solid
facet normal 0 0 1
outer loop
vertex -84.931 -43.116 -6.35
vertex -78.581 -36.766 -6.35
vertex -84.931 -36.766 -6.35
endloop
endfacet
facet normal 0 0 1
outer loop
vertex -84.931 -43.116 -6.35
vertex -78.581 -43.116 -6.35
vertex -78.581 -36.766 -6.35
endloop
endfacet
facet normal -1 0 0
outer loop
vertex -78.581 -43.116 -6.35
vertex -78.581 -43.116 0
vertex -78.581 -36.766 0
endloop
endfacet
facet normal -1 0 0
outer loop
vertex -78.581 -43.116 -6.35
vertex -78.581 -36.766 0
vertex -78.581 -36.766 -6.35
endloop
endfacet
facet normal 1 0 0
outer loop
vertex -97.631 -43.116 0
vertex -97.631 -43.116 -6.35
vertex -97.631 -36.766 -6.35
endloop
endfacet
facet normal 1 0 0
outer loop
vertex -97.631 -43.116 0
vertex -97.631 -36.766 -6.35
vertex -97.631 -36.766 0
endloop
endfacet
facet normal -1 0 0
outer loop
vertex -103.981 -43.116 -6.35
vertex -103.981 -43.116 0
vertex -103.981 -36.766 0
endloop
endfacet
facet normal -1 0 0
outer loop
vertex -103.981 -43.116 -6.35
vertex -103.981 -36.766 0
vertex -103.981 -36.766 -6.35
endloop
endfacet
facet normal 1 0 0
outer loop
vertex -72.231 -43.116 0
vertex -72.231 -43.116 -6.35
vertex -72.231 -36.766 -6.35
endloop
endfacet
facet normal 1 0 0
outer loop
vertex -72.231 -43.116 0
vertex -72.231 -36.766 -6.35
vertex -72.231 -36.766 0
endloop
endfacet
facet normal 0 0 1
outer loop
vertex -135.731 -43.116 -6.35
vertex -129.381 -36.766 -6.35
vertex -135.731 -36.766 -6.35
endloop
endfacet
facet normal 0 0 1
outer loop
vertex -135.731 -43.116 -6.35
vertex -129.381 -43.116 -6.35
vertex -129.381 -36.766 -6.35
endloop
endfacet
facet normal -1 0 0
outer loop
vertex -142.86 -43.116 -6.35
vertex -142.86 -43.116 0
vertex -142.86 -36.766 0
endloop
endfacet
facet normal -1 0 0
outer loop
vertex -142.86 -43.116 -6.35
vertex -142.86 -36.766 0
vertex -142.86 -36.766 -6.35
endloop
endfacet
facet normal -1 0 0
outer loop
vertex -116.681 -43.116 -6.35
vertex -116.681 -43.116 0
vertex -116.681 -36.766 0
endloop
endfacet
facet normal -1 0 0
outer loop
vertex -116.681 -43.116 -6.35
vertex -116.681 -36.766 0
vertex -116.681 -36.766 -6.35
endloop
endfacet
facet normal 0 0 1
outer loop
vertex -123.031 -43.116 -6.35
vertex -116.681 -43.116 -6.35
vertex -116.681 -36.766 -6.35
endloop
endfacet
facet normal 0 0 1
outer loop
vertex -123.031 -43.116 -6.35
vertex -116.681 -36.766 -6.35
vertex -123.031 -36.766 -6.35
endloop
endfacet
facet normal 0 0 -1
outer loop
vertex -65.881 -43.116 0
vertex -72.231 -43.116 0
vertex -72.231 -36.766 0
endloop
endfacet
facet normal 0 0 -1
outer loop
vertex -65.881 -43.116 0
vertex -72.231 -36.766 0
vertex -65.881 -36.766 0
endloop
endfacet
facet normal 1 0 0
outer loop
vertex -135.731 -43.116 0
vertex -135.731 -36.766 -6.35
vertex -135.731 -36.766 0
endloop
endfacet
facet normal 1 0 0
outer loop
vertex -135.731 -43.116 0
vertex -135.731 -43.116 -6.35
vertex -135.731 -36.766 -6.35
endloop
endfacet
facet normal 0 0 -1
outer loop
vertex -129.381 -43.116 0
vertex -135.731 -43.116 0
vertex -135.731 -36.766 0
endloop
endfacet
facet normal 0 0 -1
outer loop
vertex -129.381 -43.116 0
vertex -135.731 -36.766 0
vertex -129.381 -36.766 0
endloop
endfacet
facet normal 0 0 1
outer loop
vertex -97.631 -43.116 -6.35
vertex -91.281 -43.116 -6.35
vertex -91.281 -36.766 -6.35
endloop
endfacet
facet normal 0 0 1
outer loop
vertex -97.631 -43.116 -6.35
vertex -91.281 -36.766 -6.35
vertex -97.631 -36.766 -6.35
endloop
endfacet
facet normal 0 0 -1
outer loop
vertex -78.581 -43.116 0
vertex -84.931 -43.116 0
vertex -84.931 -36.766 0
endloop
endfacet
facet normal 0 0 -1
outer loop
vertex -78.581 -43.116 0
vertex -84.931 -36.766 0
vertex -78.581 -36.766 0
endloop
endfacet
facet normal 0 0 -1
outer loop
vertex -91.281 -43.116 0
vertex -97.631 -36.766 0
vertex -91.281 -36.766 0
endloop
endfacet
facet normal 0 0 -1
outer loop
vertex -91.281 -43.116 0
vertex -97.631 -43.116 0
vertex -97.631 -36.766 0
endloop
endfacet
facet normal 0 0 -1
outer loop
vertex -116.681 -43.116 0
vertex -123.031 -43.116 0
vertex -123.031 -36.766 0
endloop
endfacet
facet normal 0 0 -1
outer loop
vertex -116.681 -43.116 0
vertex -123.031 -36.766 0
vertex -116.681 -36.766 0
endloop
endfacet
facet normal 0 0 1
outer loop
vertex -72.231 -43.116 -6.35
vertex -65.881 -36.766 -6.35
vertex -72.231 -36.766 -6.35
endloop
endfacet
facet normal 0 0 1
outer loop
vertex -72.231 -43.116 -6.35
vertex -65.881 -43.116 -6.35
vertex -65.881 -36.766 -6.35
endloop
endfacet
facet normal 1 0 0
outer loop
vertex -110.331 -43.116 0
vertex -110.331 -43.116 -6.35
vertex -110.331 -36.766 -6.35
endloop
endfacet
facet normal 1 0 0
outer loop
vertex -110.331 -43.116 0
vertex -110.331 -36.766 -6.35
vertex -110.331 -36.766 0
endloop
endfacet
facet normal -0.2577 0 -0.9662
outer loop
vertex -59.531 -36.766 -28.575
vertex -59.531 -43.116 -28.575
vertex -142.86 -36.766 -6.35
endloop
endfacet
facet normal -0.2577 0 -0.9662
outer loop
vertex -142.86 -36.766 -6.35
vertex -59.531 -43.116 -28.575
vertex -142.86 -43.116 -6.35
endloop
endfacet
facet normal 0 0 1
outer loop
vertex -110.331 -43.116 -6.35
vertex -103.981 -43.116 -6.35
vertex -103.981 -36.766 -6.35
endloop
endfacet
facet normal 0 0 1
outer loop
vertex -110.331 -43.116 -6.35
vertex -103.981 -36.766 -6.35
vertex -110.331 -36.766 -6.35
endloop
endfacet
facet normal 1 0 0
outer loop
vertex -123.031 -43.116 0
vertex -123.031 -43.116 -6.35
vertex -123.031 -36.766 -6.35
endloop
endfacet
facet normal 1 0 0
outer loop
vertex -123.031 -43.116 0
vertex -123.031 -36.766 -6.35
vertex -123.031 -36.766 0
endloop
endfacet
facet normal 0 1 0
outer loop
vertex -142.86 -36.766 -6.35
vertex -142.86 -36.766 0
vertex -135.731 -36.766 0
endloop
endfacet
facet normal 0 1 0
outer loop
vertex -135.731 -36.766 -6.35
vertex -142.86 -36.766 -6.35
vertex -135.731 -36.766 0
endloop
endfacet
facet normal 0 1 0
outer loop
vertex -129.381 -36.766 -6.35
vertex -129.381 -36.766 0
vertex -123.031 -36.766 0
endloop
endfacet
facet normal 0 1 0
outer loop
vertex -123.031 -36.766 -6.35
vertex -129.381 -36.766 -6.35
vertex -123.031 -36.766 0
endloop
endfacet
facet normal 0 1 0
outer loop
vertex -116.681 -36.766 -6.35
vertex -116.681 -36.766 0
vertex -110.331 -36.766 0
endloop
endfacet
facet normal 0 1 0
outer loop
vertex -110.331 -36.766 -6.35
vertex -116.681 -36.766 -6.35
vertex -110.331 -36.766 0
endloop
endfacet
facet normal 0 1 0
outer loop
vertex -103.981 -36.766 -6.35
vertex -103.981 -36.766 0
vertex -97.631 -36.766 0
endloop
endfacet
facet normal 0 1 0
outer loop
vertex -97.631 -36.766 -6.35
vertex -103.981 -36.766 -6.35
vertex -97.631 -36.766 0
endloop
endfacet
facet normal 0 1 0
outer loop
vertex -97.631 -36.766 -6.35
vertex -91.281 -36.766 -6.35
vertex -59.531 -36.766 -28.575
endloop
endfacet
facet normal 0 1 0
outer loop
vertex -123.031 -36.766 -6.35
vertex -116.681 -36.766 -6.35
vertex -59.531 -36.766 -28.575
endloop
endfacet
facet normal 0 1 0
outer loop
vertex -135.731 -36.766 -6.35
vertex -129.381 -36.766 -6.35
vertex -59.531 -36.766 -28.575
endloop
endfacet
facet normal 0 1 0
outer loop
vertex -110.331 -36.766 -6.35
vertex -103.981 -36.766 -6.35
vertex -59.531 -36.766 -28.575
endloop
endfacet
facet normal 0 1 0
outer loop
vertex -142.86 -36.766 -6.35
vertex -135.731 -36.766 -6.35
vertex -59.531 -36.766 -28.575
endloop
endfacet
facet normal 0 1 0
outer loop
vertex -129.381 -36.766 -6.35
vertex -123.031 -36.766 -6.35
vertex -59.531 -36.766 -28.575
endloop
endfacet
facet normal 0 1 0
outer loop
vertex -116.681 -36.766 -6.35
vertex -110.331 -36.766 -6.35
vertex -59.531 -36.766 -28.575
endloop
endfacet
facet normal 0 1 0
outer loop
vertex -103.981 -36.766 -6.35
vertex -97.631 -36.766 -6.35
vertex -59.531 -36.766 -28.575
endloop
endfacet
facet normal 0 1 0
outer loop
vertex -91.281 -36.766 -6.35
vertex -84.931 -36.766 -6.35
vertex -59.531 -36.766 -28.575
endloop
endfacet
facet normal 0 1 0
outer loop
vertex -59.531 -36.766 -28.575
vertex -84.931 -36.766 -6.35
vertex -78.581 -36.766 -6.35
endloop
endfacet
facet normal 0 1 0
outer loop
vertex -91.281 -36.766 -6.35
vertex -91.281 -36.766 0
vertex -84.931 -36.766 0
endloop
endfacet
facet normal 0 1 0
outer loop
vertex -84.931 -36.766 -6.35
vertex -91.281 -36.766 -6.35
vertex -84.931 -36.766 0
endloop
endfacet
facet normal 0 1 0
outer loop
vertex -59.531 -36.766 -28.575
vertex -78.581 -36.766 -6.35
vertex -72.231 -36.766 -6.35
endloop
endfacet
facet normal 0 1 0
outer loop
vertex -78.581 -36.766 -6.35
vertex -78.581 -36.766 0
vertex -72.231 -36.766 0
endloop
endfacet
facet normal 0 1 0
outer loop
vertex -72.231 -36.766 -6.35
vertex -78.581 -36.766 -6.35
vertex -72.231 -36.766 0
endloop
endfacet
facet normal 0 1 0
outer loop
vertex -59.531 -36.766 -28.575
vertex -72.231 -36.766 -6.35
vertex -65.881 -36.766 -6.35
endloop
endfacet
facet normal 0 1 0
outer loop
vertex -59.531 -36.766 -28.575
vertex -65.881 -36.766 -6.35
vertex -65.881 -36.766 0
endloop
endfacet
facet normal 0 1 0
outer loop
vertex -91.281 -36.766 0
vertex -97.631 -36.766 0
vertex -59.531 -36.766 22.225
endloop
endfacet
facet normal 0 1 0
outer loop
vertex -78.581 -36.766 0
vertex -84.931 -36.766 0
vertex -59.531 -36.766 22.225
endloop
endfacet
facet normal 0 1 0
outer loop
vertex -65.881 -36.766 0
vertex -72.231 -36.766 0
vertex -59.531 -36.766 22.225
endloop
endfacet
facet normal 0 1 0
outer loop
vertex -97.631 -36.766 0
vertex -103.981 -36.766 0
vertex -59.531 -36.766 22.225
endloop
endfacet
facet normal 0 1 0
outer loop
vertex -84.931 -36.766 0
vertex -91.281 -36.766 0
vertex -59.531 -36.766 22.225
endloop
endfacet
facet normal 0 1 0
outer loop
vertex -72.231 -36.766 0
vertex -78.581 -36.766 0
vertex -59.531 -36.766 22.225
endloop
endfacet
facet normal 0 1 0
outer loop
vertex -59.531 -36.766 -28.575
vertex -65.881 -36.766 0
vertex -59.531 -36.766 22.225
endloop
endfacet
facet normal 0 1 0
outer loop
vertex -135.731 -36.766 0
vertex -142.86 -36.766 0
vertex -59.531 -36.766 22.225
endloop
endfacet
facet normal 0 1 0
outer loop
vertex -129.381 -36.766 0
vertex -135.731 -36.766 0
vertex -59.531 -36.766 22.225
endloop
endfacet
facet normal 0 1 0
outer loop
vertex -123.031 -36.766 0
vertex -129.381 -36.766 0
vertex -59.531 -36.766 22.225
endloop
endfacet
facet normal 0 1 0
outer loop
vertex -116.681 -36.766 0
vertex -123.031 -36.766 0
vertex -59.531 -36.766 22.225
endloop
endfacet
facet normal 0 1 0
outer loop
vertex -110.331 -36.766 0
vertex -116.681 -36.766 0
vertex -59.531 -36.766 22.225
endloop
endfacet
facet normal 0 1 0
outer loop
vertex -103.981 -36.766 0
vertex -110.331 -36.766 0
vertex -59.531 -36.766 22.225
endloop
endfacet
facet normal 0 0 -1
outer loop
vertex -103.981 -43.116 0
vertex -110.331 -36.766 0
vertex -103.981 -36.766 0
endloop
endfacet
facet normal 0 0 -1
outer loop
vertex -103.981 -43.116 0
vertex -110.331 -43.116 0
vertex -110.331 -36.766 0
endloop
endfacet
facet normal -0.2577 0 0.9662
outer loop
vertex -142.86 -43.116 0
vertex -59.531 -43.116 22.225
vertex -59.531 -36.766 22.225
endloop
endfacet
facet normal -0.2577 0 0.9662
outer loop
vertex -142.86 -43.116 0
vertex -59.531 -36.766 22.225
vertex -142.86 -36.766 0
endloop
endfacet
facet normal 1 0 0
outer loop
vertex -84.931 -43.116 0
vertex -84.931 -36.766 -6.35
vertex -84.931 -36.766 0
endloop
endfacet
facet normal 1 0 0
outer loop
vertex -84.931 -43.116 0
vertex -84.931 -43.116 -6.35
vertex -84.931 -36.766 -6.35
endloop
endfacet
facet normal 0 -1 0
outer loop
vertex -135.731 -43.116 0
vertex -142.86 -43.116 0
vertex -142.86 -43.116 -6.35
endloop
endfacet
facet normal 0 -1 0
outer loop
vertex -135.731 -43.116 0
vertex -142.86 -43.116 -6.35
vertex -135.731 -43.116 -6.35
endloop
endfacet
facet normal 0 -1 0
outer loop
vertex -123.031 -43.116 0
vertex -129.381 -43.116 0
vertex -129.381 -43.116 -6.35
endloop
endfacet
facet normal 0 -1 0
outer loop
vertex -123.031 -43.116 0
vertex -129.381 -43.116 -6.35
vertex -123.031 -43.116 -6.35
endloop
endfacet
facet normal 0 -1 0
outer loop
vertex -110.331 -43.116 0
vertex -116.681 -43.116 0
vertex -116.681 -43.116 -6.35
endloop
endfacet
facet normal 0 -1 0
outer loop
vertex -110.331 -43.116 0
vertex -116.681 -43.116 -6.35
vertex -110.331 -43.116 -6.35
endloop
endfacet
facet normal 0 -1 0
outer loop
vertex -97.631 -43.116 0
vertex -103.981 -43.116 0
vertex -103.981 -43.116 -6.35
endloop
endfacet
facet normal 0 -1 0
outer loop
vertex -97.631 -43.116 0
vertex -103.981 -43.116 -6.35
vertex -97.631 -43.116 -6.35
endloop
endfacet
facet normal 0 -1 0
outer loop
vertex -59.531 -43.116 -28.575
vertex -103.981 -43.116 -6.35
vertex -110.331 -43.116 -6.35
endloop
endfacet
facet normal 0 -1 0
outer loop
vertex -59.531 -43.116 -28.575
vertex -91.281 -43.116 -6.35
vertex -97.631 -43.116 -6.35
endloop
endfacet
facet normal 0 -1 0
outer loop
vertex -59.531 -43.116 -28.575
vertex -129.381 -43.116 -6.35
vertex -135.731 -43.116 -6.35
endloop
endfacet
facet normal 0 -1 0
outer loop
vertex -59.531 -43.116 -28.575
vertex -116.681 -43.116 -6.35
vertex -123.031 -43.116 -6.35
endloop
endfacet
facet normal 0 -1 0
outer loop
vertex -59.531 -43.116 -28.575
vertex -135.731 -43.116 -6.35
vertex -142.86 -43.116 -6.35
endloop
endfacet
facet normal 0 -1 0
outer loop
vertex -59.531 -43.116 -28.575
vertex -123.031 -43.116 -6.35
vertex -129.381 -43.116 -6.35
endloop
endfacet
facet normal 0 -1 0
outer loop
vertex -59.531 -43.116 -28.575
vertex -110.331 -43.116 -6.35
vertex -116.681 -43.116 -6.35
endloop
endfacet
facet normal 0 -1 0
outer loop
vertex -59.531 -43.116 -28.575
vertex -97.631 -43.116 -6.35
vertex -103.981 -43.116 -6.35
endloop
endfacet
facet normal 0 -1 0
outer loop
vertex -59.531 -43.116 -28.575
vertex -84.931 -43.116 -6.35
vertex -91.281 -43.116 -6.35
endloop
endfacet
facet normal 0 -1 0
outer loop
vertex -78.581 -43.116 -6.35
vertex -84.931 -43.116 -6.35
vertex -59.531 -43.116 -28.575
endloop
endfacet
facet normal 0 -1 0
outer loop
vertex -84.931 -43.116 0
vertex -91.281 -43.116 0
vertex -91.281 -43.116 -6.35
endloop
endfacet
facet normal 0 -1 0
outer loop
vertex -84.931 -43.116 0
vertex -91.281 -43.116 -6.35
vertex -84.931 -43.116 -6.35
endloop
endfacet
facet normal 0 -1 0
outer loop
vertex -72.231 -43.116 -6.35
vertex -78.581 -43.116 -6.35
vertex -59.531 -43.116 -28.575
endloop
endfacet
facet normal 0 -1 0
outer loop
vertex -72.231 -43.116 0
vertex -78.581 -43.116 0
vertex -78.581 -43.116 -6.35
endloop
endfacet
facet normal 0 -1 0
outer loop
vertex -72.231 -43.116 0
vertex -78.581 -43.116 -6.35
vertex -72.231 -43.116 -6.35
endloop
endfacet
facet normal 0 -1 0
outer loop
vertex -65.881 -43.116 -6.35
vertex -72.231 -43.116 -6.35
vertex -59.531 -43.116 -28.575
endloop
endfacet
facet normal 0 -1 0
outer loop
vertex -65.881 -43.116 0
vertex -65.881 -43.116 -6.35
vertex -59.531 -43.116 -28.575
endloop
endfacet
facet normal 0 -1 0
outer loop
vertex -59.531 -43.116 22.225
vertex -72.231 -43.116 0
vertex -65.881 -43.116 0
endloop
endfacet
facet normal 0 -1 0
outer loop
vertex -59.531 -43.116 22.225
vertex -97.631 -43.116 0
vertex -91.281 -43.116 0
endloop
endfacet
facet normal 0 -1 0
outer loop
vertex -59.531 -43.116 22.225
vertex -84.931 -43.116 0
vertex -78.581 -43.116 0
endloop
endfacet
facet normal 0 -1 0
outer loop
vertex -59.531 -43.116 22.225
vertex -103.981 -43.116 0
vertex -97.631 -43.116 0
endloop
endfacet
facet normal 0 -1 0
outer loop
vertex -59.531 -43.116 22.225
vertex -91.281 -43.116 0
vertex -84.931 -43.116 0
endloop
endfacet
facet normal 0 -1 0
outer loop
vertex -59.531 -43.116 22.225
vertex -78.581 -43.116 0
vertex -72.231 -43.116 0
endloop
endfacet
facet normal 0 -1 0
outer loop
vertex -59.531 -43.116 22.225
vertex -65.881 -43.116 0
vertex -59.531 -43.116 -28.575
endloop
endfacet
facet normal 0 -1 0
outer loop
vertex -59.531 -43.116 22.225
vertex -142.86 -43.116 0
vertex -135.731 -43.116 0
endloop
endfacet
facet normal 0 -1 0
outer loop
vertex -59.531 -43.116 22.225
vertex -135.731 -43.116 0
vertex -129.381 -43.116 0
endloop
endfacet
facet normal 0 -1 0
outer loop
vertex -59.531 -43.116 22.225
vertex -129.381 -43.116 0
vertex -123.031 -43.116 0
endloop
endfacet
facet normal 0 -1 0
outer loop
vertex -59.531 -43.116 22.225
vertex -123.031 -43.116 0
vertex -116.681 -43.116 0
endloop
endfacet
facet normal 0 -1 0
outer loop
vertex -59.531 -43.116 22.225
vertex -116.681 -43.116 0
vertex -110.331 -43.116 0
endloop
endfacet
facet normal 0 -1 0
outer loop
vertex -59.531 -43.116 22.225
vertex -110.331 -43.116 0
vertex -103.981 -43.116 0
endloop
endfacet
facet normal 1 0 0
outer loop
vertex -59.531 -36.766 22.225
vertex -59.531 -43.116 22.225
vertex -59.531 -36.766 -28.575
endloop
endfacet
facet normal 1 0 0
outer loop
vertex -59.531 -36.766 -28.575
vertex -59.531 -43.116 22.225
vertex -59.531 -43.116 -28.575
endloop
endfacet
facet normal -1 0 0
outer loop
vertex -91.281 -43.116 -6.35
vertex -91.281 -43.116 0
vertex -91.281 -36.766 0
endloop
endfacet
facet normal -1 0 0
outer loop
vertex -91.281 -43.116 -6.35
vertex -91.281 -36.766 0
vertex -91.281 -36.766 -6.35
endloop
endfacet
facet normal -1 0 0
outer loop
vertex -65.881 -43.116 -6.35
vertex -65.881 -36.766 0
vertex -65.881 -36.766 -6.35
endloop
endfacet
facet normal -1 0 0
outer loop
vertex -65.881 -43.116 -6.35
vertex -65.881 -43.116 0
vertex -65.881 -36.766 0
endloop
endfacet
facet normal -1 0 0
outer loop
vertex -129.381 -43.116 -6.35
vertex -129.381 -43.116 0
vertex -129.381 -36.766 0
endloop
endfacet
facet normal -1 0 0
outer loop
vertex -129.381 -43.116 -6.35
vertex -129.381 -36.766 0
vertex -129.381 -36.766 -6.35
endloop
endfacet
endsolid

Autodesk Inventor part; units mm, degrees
ref_plane "YZ Plane" through (0, 0, 0) normal (1, 0, 0) x (0, 1, 0)
ref_plane "XZ Plane" through (0, 0, 0) normal (0, 1, 0) x (-1, 0, 0)
ref_plane "XY Plane" through (0, 0, 0) normal (0, 0, 1) x (1, 0, 0)
ref_plane "Work Plane1" through (-521.128, -68.463, 0) normal (0, 0, 1) x (-0.9986, 0.0523, 0)
ref_plane "Work Plane2" through (223.5893, -43.1165, -6.351) normal (0, -1, 0) x (1, 0, 0)
sketch "Sketch1" plane through (223.5893, -43.1165, -6.351) normal (0, -1, 0) x (1, 0, 0)
  line L0 (-282.6219, 6.351) -> (-282.6219, 0.001) projected
  line L1 (-173.8519, 0.001) -> (-282.6219, 0.001) projected
  line L2 (-282.6219, 6.351) -> (-173.8519, 6.351) projected
  line L3 (-283.1206, 28.576) -> (-366.4496, 6.351)
  line L4 (-283.1206, 3.176) -> (-376.14, 3.176) construction
  line L5 (-283.1206, -22.224) -> (-366.4496, 0.001)
  line L6 (-366.4496, 6.351) -> (-366.4496, 0.001)
  line L7 (-283.1206, 28.576) -> (-283.1206, -22.224)
  line L8 (-289.4706, 0.001) -> (-295.8206, 0.001)
  line L9 (-295.8206, 0.001) -> (-295.8206, 6.351)
  line L10 (-295.8206, 6.351) -> (-289.4706, 6.351)
  line L11 (-289.4706, 6.351) -> (-289.4706, 0.001)
  line L12 (-302.1706, 0.001) -> (-308.5206, 0.001)
  line L13 (-308.5206, 0.001) -> (-308.5206, 6.351)
  line L14 (-308.5206, 6.351) -> (-302.1706, 6.351)
  line L15 (-302.1706, 6.351) -> (-302.1706, 0.001)
  line L16 (-314.8706, 0.001) -> (-321.2206, 0.001)
  line L17 (-321.2206, 0.001) -> (-321.2206, 6.351)
  line L18 (-321.2206, 6.351) -> (-314.8706, 6.351)
  line L19 (-314.8706, 6.351) -> (-314.8706, 0.001)
  line L20 (-327.5706, 0.001) -> (-333.9206, 0.001)
  line L21 (-333.9206, 0.001) -> (-333.9206, 6.351)
  line L22 (-333.9206, 6.351) -> (-327.5706, 6.351)
  line L23 (-327.5706, 6.351) -> (-327.5706, 0.001)
  line L24 (-340.2706, 0.001) -> (-346.6206, 0.001)
  line L25 (-346.6206, 0.001) -> (-346.6206, 6.351)
  line L26 (-346.6206, 6.351) -> (-340.2706, 6.351)
  line L27 (-340.2706, 6.351) -> (-340.2706, 0.001)
  line L28 (-352.9706, 0.001) -> (-359.3206, 0.001)
  line L29 (-359.3206, 0.001) -> (-359.3206, 6.351)
  line L30 (-359.3206, 6.351) -> (-352.9706, 6.351)
  line L31 (-352.9706, 6.351) -> (-352.9706, 0.001)
  line L32 (-282.6219, 6.351) -> (-282.6219, 0.001) projected
  line L33 (-173.8519, 6.351) -> (-173.8519, 0.001) projected
  point P0 (-223.5893, 6.351)
  dimension "d17" = 12.7
extrude "Extrusion2" add sketch "Sketch1" against normal blind 6.35 contours L7 L5 L6 L3
properties part number "brace01"
